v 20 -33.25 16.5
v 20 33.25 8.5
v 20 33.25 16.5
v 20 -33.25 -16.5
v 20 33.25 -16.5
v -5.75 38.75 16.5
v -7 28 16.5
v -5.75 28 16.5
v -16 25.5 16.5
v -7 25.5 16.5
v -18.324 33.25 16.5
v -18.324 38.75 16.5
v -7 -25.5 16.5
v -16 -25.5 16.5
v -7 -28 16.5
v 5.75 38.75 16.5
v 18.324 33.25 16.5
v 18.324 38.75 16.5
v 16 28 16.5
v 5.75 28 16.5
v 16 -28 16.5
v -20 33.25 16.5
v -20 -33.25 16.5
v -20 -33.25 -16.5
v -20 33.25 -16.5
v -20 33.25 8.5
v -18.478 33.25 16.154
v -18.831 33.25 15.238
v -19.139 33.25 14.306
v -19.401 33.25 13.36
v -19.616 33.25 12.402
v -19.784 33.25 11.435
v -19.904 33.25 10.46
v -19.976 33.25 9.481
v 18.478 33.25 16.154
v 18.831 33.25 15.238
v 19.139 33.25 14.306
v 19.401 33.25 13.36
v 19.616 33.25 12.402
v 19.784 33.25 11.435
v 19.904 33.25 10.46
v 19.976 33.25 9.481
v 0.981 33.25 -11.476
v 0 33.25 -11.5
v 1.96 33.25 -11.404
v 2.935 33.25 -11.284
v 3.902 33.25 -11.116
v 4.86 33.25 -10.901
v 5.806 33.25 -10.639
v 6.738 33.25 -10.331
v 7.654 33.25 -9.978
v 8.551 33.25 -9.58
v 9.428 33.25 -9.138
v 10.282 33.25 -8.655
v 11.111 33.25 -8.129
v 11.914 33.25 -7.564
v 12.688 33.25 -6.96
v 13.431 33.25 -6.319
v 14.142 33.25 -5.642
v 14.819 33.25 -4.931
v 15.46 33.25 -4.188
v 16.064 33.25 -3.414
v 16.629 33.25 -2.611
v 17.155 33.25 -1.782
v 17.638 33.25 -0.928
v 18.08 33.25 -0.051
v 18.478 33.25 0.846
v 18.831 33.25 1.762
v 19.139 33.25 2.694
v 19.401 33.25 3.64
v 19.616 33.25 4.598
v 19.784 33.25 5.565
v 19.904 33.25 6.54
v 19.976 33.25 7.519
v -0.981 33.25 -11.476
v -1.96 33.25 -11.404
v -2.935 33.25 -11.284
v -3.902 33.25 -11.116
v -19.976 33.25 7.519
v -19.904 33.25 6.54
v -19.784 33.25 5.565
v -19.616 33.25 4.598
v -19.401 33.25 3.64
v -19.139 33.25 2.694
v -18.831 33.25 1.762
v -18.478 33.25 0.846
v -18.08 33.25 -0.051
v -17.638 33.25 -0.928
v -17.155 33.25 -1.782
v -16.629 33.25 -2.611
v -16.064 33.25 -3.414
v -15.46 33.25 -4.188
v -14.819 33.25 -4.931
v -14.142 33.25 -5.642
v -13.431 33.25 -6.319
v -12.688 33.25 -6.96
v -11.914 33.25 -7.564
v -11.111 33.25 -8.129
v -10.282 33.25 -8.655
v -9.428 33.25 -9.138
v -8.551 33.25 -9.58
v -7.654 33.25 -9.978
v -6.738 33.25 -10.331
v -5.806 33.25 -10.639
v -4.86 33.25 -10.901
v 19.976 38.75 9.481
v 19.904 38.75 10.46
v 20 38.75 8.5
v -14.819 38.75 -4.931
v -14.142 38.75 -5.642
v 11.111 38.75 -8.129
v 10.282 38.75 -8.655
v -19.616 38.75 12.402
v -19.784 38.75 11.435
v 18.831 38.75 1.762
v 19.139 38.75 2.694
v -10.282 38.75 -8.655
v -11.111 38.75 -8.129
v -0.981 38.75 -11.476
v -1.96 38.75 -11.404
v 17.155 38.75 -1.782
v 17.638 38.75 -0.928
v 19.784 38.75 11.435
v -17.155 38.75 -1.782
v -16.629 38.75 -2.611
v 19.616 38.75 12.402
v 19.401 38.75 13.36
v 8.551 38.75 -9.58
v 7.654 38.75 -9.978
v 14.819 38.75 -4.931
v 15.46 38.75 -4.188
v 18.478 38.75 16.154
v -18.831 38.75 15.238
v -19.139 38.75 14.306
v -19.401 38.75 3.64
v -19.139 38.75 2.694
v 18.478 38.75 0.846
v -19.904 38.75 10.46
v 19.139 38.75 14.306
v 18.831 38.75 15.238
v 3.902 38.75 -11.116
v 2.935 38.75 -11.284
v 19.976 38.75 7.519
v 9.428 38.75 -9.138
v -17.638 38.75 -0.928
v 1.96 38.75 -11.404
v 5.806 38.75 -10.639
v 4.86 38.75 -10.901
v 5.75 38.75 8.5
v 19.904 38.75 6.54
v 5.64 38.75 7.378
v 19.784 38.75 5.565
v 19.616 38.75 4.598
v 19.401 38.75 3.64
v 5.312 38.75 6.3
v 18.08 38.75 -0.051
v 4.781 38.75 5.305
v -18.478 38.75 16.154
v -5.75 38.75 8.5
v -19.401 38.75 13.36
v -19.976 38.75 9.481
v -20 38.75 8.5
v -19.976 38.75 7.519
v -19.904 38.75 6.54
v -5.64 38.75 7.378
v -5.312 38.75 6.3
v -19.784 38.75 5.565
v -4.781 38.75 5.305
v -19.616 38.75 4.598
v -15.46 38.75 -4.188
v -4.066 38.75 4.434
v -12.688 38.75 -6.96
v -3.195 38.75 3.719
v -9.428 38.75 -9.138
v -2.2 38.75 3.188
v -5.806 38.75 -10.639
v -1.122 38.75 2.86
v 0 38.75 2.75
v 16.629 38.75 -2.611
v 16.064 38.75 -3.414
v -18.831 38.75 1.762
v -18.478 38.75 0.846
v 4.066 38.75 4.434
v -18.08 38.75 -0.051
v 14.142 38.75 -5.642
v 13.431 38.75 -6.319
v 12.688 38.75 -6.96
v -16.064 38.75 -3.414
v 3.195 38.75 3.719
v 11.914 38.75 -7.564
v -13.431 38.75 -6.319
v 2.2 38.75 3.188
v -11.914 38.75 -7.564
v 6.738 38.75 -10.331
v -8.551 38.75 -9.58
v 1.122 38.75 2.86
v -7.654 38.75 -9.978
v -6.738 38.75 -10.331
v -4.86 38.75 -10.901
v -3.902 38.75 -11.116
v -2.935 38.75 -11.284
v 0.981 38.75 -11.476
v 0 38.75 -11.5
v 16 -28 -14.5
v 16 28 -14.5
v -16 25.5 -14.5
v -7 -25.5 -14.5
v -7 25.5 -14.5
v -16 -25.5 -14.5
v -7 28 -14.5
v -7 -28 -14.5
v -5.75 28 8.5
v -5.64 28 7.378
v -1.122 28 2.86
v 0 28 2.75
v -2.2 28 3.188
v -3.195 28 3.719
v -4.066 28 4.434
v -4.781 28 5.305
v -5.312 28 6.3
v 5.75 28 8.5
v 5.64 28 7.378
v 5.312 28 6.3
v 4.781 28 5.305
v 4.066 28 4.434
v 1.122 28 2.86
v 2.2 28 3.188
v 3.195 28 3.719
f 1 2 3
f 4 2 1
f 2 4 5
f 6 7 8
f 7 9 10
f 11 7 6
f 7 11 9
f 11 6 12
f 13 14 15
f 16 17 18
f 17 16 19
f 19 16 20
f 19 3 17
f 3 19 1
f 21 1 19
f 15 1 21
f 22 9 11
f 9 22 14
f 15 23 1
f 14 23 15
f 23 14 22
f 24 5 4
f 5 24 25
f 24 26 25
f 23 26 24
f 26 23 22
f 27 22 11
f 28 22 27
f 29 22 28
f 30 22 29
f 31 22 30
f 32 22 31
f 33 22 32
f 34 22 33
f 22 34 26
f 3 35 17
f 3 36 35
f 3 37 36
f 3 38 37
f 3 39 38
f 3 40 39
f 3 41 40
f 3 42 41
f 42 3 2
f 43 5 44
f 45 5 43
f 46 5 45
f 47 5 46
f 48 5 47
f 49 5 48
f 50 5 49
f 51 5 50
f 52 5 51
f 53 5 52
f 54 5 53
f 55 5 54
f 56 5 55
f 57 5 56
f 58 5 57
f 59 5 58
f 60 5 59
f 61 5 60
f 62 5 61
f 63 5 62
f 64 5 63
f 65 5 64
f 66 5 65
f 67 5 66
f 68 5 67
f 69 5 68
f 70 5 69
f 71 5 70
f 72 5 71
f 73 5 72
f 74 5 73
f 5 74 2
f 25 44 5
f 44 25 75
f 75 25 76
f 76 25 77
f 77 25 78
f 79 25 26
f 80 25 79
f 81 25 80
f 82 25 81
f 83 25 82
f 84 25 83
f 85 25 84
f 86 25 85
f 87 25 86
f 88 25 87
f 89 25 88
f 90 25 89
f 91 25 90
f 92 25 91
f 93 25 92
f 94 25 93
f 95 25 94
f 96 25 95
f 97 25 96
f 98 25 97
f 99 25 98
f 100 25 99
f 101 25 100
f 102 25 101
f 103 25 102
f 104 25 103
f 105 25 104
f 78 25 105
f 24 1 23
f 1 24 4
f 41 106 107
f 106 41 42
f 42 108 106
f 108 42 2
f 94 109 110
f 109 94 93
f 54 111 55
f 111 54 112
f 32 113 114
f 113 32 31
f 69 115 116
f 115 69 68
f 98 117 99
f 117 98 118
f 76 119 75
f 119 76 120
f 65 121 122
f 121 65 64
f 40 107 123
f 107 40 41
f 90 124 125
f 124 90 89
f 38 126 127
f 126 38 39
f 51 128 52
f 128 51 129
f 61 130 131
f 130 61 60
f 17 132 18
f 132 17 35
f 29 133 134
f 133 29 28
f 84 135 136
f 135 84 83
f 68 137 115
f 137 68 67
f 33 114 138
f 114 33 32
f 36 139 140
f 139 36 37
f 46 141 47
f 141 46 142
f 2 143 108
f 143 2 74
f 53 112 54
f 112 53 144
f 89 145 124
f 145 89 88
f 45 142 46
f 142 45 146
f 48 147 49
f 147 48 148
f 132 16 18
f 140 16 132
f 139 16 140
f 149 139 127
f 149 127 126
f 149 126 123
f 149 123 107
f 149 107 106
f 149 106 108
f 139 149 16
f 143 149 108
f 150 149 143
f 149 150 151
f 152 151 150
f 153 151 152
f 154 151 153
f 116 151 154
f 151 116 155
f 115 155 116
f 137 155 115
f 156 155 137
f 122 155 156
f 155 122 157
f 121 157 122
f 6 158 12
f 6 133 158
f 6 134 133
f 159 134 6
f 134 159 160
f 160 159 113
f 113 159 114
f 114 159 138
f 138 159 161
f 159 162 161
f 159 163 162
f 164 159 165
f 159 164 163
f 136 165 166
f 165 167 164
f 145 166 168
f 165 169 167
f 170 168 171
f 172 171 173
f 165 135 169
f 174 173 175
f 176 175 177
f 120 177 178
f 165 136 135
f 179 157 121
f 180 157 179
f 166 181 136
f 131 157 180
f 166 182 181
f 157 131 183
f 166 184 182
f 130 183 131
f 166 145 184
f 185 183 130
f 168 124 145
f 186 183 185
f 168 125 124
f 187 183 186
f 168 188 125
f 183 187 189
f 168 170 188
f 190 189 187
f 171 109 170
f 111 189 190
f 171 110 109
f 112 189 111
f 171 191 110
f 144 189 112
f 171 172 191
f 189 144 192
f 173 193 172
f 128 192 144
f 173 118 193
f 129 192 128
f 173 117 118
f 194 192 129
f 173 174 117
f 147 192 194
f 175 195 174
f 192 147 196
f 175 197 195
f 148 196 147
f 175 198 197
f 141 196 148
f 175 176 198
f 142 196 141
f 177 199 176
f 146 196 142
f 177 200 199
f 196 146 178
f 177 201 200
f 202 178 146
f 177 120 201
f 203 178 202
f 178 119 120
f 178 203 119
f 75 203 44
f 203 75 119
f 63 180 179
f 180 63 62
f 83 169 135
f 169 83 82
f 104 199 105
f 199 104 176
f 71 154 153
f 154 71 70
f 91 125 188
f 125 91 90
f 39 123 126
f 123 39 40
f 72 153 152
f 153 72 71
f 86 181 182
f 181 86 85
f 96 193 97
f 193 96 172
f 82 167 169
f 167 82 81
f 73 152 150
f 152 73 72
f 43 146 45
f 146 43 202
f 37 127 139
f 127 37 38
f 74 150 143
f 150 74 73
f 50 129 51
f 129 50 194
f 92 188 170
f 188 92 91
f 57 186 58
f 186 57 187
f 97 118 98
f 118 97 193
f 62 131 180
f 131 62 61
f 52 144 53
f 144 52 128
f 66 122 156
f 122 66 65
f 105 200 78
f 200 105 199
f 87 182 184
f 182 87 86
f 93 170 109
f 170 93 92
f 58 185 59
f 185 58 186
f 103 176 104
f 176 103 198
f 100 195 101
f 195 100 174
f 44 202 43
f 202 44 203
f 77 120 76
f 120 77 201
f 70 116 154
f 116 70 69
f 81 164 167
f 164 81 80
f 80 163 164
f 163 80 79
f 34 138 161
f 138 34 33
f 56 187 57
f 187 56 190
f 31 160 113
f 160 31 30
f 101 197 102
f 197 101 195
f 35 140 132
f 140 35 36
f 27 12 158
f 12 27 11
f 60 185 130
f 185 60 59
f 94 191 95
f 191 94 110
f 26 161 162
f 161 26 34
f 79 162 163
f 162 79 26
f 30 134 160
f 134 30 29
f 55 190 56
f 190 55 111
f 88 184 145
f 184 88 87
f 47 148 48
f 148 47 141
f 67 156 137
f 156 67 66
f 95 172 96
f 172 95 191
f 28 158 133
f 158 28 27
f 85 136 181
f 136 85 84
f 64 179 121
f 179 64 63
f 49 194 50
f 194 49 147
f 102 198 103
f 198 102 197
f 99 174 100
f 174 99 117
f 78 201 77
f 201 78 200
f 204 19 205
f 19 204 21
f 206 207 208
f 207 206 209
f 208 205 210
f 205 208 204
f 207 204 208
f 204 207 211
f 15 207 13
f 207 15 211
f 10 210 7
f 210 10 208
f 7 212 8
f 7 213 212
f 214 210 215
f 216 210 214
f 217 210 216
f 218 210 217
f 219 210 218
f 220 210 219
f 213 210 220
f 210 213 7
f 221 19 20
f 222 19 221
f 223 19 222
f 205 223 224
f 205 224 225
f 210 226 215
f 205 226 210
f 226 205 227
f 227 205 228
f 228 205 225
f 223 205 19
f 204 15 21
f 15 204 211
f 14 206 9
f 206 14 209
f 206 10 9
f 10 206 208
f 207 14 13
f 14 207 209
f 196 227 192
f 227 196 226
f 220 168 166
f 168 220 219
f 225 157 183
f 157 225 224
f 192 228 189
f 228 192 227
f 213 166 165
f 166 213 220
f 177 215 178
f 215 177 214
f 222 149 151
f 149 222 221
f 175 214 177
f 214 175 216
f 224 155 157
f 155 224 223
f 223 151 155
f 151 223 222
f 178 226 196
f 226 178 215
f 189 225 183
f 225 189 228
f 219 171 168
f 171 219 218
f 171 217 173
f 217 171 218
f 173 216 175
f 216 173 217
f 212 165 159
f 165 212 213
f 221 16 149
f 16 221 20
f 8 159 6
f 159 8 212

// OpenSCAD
module Base()
{
  difference() {
    union () {
      cube([40, 66.5, 33], center=true);
      translate([0, 5.5, 8.5]) rotate([90, 0, 0])cylinder($fn=128, r=20, h=66.5, center=true); 
    }
    translate([0 ,0, 36.5])cube([50, 80, 40], center=true);

    translate([4.5,0, 2])cube([23, 56, 33], center=true);
    translate([-4.5,0, 2])cube([23, 51, 33], center=true);
    translate([0, 15, 8.5]) rotate([90, 0, 0])cylinder($fn=32, r=5.75, h=80, center=true); 
    translate([0, 15, 14.25]) cube([11.5, 80, 11.5], center=true); 

  }
}

Base();
